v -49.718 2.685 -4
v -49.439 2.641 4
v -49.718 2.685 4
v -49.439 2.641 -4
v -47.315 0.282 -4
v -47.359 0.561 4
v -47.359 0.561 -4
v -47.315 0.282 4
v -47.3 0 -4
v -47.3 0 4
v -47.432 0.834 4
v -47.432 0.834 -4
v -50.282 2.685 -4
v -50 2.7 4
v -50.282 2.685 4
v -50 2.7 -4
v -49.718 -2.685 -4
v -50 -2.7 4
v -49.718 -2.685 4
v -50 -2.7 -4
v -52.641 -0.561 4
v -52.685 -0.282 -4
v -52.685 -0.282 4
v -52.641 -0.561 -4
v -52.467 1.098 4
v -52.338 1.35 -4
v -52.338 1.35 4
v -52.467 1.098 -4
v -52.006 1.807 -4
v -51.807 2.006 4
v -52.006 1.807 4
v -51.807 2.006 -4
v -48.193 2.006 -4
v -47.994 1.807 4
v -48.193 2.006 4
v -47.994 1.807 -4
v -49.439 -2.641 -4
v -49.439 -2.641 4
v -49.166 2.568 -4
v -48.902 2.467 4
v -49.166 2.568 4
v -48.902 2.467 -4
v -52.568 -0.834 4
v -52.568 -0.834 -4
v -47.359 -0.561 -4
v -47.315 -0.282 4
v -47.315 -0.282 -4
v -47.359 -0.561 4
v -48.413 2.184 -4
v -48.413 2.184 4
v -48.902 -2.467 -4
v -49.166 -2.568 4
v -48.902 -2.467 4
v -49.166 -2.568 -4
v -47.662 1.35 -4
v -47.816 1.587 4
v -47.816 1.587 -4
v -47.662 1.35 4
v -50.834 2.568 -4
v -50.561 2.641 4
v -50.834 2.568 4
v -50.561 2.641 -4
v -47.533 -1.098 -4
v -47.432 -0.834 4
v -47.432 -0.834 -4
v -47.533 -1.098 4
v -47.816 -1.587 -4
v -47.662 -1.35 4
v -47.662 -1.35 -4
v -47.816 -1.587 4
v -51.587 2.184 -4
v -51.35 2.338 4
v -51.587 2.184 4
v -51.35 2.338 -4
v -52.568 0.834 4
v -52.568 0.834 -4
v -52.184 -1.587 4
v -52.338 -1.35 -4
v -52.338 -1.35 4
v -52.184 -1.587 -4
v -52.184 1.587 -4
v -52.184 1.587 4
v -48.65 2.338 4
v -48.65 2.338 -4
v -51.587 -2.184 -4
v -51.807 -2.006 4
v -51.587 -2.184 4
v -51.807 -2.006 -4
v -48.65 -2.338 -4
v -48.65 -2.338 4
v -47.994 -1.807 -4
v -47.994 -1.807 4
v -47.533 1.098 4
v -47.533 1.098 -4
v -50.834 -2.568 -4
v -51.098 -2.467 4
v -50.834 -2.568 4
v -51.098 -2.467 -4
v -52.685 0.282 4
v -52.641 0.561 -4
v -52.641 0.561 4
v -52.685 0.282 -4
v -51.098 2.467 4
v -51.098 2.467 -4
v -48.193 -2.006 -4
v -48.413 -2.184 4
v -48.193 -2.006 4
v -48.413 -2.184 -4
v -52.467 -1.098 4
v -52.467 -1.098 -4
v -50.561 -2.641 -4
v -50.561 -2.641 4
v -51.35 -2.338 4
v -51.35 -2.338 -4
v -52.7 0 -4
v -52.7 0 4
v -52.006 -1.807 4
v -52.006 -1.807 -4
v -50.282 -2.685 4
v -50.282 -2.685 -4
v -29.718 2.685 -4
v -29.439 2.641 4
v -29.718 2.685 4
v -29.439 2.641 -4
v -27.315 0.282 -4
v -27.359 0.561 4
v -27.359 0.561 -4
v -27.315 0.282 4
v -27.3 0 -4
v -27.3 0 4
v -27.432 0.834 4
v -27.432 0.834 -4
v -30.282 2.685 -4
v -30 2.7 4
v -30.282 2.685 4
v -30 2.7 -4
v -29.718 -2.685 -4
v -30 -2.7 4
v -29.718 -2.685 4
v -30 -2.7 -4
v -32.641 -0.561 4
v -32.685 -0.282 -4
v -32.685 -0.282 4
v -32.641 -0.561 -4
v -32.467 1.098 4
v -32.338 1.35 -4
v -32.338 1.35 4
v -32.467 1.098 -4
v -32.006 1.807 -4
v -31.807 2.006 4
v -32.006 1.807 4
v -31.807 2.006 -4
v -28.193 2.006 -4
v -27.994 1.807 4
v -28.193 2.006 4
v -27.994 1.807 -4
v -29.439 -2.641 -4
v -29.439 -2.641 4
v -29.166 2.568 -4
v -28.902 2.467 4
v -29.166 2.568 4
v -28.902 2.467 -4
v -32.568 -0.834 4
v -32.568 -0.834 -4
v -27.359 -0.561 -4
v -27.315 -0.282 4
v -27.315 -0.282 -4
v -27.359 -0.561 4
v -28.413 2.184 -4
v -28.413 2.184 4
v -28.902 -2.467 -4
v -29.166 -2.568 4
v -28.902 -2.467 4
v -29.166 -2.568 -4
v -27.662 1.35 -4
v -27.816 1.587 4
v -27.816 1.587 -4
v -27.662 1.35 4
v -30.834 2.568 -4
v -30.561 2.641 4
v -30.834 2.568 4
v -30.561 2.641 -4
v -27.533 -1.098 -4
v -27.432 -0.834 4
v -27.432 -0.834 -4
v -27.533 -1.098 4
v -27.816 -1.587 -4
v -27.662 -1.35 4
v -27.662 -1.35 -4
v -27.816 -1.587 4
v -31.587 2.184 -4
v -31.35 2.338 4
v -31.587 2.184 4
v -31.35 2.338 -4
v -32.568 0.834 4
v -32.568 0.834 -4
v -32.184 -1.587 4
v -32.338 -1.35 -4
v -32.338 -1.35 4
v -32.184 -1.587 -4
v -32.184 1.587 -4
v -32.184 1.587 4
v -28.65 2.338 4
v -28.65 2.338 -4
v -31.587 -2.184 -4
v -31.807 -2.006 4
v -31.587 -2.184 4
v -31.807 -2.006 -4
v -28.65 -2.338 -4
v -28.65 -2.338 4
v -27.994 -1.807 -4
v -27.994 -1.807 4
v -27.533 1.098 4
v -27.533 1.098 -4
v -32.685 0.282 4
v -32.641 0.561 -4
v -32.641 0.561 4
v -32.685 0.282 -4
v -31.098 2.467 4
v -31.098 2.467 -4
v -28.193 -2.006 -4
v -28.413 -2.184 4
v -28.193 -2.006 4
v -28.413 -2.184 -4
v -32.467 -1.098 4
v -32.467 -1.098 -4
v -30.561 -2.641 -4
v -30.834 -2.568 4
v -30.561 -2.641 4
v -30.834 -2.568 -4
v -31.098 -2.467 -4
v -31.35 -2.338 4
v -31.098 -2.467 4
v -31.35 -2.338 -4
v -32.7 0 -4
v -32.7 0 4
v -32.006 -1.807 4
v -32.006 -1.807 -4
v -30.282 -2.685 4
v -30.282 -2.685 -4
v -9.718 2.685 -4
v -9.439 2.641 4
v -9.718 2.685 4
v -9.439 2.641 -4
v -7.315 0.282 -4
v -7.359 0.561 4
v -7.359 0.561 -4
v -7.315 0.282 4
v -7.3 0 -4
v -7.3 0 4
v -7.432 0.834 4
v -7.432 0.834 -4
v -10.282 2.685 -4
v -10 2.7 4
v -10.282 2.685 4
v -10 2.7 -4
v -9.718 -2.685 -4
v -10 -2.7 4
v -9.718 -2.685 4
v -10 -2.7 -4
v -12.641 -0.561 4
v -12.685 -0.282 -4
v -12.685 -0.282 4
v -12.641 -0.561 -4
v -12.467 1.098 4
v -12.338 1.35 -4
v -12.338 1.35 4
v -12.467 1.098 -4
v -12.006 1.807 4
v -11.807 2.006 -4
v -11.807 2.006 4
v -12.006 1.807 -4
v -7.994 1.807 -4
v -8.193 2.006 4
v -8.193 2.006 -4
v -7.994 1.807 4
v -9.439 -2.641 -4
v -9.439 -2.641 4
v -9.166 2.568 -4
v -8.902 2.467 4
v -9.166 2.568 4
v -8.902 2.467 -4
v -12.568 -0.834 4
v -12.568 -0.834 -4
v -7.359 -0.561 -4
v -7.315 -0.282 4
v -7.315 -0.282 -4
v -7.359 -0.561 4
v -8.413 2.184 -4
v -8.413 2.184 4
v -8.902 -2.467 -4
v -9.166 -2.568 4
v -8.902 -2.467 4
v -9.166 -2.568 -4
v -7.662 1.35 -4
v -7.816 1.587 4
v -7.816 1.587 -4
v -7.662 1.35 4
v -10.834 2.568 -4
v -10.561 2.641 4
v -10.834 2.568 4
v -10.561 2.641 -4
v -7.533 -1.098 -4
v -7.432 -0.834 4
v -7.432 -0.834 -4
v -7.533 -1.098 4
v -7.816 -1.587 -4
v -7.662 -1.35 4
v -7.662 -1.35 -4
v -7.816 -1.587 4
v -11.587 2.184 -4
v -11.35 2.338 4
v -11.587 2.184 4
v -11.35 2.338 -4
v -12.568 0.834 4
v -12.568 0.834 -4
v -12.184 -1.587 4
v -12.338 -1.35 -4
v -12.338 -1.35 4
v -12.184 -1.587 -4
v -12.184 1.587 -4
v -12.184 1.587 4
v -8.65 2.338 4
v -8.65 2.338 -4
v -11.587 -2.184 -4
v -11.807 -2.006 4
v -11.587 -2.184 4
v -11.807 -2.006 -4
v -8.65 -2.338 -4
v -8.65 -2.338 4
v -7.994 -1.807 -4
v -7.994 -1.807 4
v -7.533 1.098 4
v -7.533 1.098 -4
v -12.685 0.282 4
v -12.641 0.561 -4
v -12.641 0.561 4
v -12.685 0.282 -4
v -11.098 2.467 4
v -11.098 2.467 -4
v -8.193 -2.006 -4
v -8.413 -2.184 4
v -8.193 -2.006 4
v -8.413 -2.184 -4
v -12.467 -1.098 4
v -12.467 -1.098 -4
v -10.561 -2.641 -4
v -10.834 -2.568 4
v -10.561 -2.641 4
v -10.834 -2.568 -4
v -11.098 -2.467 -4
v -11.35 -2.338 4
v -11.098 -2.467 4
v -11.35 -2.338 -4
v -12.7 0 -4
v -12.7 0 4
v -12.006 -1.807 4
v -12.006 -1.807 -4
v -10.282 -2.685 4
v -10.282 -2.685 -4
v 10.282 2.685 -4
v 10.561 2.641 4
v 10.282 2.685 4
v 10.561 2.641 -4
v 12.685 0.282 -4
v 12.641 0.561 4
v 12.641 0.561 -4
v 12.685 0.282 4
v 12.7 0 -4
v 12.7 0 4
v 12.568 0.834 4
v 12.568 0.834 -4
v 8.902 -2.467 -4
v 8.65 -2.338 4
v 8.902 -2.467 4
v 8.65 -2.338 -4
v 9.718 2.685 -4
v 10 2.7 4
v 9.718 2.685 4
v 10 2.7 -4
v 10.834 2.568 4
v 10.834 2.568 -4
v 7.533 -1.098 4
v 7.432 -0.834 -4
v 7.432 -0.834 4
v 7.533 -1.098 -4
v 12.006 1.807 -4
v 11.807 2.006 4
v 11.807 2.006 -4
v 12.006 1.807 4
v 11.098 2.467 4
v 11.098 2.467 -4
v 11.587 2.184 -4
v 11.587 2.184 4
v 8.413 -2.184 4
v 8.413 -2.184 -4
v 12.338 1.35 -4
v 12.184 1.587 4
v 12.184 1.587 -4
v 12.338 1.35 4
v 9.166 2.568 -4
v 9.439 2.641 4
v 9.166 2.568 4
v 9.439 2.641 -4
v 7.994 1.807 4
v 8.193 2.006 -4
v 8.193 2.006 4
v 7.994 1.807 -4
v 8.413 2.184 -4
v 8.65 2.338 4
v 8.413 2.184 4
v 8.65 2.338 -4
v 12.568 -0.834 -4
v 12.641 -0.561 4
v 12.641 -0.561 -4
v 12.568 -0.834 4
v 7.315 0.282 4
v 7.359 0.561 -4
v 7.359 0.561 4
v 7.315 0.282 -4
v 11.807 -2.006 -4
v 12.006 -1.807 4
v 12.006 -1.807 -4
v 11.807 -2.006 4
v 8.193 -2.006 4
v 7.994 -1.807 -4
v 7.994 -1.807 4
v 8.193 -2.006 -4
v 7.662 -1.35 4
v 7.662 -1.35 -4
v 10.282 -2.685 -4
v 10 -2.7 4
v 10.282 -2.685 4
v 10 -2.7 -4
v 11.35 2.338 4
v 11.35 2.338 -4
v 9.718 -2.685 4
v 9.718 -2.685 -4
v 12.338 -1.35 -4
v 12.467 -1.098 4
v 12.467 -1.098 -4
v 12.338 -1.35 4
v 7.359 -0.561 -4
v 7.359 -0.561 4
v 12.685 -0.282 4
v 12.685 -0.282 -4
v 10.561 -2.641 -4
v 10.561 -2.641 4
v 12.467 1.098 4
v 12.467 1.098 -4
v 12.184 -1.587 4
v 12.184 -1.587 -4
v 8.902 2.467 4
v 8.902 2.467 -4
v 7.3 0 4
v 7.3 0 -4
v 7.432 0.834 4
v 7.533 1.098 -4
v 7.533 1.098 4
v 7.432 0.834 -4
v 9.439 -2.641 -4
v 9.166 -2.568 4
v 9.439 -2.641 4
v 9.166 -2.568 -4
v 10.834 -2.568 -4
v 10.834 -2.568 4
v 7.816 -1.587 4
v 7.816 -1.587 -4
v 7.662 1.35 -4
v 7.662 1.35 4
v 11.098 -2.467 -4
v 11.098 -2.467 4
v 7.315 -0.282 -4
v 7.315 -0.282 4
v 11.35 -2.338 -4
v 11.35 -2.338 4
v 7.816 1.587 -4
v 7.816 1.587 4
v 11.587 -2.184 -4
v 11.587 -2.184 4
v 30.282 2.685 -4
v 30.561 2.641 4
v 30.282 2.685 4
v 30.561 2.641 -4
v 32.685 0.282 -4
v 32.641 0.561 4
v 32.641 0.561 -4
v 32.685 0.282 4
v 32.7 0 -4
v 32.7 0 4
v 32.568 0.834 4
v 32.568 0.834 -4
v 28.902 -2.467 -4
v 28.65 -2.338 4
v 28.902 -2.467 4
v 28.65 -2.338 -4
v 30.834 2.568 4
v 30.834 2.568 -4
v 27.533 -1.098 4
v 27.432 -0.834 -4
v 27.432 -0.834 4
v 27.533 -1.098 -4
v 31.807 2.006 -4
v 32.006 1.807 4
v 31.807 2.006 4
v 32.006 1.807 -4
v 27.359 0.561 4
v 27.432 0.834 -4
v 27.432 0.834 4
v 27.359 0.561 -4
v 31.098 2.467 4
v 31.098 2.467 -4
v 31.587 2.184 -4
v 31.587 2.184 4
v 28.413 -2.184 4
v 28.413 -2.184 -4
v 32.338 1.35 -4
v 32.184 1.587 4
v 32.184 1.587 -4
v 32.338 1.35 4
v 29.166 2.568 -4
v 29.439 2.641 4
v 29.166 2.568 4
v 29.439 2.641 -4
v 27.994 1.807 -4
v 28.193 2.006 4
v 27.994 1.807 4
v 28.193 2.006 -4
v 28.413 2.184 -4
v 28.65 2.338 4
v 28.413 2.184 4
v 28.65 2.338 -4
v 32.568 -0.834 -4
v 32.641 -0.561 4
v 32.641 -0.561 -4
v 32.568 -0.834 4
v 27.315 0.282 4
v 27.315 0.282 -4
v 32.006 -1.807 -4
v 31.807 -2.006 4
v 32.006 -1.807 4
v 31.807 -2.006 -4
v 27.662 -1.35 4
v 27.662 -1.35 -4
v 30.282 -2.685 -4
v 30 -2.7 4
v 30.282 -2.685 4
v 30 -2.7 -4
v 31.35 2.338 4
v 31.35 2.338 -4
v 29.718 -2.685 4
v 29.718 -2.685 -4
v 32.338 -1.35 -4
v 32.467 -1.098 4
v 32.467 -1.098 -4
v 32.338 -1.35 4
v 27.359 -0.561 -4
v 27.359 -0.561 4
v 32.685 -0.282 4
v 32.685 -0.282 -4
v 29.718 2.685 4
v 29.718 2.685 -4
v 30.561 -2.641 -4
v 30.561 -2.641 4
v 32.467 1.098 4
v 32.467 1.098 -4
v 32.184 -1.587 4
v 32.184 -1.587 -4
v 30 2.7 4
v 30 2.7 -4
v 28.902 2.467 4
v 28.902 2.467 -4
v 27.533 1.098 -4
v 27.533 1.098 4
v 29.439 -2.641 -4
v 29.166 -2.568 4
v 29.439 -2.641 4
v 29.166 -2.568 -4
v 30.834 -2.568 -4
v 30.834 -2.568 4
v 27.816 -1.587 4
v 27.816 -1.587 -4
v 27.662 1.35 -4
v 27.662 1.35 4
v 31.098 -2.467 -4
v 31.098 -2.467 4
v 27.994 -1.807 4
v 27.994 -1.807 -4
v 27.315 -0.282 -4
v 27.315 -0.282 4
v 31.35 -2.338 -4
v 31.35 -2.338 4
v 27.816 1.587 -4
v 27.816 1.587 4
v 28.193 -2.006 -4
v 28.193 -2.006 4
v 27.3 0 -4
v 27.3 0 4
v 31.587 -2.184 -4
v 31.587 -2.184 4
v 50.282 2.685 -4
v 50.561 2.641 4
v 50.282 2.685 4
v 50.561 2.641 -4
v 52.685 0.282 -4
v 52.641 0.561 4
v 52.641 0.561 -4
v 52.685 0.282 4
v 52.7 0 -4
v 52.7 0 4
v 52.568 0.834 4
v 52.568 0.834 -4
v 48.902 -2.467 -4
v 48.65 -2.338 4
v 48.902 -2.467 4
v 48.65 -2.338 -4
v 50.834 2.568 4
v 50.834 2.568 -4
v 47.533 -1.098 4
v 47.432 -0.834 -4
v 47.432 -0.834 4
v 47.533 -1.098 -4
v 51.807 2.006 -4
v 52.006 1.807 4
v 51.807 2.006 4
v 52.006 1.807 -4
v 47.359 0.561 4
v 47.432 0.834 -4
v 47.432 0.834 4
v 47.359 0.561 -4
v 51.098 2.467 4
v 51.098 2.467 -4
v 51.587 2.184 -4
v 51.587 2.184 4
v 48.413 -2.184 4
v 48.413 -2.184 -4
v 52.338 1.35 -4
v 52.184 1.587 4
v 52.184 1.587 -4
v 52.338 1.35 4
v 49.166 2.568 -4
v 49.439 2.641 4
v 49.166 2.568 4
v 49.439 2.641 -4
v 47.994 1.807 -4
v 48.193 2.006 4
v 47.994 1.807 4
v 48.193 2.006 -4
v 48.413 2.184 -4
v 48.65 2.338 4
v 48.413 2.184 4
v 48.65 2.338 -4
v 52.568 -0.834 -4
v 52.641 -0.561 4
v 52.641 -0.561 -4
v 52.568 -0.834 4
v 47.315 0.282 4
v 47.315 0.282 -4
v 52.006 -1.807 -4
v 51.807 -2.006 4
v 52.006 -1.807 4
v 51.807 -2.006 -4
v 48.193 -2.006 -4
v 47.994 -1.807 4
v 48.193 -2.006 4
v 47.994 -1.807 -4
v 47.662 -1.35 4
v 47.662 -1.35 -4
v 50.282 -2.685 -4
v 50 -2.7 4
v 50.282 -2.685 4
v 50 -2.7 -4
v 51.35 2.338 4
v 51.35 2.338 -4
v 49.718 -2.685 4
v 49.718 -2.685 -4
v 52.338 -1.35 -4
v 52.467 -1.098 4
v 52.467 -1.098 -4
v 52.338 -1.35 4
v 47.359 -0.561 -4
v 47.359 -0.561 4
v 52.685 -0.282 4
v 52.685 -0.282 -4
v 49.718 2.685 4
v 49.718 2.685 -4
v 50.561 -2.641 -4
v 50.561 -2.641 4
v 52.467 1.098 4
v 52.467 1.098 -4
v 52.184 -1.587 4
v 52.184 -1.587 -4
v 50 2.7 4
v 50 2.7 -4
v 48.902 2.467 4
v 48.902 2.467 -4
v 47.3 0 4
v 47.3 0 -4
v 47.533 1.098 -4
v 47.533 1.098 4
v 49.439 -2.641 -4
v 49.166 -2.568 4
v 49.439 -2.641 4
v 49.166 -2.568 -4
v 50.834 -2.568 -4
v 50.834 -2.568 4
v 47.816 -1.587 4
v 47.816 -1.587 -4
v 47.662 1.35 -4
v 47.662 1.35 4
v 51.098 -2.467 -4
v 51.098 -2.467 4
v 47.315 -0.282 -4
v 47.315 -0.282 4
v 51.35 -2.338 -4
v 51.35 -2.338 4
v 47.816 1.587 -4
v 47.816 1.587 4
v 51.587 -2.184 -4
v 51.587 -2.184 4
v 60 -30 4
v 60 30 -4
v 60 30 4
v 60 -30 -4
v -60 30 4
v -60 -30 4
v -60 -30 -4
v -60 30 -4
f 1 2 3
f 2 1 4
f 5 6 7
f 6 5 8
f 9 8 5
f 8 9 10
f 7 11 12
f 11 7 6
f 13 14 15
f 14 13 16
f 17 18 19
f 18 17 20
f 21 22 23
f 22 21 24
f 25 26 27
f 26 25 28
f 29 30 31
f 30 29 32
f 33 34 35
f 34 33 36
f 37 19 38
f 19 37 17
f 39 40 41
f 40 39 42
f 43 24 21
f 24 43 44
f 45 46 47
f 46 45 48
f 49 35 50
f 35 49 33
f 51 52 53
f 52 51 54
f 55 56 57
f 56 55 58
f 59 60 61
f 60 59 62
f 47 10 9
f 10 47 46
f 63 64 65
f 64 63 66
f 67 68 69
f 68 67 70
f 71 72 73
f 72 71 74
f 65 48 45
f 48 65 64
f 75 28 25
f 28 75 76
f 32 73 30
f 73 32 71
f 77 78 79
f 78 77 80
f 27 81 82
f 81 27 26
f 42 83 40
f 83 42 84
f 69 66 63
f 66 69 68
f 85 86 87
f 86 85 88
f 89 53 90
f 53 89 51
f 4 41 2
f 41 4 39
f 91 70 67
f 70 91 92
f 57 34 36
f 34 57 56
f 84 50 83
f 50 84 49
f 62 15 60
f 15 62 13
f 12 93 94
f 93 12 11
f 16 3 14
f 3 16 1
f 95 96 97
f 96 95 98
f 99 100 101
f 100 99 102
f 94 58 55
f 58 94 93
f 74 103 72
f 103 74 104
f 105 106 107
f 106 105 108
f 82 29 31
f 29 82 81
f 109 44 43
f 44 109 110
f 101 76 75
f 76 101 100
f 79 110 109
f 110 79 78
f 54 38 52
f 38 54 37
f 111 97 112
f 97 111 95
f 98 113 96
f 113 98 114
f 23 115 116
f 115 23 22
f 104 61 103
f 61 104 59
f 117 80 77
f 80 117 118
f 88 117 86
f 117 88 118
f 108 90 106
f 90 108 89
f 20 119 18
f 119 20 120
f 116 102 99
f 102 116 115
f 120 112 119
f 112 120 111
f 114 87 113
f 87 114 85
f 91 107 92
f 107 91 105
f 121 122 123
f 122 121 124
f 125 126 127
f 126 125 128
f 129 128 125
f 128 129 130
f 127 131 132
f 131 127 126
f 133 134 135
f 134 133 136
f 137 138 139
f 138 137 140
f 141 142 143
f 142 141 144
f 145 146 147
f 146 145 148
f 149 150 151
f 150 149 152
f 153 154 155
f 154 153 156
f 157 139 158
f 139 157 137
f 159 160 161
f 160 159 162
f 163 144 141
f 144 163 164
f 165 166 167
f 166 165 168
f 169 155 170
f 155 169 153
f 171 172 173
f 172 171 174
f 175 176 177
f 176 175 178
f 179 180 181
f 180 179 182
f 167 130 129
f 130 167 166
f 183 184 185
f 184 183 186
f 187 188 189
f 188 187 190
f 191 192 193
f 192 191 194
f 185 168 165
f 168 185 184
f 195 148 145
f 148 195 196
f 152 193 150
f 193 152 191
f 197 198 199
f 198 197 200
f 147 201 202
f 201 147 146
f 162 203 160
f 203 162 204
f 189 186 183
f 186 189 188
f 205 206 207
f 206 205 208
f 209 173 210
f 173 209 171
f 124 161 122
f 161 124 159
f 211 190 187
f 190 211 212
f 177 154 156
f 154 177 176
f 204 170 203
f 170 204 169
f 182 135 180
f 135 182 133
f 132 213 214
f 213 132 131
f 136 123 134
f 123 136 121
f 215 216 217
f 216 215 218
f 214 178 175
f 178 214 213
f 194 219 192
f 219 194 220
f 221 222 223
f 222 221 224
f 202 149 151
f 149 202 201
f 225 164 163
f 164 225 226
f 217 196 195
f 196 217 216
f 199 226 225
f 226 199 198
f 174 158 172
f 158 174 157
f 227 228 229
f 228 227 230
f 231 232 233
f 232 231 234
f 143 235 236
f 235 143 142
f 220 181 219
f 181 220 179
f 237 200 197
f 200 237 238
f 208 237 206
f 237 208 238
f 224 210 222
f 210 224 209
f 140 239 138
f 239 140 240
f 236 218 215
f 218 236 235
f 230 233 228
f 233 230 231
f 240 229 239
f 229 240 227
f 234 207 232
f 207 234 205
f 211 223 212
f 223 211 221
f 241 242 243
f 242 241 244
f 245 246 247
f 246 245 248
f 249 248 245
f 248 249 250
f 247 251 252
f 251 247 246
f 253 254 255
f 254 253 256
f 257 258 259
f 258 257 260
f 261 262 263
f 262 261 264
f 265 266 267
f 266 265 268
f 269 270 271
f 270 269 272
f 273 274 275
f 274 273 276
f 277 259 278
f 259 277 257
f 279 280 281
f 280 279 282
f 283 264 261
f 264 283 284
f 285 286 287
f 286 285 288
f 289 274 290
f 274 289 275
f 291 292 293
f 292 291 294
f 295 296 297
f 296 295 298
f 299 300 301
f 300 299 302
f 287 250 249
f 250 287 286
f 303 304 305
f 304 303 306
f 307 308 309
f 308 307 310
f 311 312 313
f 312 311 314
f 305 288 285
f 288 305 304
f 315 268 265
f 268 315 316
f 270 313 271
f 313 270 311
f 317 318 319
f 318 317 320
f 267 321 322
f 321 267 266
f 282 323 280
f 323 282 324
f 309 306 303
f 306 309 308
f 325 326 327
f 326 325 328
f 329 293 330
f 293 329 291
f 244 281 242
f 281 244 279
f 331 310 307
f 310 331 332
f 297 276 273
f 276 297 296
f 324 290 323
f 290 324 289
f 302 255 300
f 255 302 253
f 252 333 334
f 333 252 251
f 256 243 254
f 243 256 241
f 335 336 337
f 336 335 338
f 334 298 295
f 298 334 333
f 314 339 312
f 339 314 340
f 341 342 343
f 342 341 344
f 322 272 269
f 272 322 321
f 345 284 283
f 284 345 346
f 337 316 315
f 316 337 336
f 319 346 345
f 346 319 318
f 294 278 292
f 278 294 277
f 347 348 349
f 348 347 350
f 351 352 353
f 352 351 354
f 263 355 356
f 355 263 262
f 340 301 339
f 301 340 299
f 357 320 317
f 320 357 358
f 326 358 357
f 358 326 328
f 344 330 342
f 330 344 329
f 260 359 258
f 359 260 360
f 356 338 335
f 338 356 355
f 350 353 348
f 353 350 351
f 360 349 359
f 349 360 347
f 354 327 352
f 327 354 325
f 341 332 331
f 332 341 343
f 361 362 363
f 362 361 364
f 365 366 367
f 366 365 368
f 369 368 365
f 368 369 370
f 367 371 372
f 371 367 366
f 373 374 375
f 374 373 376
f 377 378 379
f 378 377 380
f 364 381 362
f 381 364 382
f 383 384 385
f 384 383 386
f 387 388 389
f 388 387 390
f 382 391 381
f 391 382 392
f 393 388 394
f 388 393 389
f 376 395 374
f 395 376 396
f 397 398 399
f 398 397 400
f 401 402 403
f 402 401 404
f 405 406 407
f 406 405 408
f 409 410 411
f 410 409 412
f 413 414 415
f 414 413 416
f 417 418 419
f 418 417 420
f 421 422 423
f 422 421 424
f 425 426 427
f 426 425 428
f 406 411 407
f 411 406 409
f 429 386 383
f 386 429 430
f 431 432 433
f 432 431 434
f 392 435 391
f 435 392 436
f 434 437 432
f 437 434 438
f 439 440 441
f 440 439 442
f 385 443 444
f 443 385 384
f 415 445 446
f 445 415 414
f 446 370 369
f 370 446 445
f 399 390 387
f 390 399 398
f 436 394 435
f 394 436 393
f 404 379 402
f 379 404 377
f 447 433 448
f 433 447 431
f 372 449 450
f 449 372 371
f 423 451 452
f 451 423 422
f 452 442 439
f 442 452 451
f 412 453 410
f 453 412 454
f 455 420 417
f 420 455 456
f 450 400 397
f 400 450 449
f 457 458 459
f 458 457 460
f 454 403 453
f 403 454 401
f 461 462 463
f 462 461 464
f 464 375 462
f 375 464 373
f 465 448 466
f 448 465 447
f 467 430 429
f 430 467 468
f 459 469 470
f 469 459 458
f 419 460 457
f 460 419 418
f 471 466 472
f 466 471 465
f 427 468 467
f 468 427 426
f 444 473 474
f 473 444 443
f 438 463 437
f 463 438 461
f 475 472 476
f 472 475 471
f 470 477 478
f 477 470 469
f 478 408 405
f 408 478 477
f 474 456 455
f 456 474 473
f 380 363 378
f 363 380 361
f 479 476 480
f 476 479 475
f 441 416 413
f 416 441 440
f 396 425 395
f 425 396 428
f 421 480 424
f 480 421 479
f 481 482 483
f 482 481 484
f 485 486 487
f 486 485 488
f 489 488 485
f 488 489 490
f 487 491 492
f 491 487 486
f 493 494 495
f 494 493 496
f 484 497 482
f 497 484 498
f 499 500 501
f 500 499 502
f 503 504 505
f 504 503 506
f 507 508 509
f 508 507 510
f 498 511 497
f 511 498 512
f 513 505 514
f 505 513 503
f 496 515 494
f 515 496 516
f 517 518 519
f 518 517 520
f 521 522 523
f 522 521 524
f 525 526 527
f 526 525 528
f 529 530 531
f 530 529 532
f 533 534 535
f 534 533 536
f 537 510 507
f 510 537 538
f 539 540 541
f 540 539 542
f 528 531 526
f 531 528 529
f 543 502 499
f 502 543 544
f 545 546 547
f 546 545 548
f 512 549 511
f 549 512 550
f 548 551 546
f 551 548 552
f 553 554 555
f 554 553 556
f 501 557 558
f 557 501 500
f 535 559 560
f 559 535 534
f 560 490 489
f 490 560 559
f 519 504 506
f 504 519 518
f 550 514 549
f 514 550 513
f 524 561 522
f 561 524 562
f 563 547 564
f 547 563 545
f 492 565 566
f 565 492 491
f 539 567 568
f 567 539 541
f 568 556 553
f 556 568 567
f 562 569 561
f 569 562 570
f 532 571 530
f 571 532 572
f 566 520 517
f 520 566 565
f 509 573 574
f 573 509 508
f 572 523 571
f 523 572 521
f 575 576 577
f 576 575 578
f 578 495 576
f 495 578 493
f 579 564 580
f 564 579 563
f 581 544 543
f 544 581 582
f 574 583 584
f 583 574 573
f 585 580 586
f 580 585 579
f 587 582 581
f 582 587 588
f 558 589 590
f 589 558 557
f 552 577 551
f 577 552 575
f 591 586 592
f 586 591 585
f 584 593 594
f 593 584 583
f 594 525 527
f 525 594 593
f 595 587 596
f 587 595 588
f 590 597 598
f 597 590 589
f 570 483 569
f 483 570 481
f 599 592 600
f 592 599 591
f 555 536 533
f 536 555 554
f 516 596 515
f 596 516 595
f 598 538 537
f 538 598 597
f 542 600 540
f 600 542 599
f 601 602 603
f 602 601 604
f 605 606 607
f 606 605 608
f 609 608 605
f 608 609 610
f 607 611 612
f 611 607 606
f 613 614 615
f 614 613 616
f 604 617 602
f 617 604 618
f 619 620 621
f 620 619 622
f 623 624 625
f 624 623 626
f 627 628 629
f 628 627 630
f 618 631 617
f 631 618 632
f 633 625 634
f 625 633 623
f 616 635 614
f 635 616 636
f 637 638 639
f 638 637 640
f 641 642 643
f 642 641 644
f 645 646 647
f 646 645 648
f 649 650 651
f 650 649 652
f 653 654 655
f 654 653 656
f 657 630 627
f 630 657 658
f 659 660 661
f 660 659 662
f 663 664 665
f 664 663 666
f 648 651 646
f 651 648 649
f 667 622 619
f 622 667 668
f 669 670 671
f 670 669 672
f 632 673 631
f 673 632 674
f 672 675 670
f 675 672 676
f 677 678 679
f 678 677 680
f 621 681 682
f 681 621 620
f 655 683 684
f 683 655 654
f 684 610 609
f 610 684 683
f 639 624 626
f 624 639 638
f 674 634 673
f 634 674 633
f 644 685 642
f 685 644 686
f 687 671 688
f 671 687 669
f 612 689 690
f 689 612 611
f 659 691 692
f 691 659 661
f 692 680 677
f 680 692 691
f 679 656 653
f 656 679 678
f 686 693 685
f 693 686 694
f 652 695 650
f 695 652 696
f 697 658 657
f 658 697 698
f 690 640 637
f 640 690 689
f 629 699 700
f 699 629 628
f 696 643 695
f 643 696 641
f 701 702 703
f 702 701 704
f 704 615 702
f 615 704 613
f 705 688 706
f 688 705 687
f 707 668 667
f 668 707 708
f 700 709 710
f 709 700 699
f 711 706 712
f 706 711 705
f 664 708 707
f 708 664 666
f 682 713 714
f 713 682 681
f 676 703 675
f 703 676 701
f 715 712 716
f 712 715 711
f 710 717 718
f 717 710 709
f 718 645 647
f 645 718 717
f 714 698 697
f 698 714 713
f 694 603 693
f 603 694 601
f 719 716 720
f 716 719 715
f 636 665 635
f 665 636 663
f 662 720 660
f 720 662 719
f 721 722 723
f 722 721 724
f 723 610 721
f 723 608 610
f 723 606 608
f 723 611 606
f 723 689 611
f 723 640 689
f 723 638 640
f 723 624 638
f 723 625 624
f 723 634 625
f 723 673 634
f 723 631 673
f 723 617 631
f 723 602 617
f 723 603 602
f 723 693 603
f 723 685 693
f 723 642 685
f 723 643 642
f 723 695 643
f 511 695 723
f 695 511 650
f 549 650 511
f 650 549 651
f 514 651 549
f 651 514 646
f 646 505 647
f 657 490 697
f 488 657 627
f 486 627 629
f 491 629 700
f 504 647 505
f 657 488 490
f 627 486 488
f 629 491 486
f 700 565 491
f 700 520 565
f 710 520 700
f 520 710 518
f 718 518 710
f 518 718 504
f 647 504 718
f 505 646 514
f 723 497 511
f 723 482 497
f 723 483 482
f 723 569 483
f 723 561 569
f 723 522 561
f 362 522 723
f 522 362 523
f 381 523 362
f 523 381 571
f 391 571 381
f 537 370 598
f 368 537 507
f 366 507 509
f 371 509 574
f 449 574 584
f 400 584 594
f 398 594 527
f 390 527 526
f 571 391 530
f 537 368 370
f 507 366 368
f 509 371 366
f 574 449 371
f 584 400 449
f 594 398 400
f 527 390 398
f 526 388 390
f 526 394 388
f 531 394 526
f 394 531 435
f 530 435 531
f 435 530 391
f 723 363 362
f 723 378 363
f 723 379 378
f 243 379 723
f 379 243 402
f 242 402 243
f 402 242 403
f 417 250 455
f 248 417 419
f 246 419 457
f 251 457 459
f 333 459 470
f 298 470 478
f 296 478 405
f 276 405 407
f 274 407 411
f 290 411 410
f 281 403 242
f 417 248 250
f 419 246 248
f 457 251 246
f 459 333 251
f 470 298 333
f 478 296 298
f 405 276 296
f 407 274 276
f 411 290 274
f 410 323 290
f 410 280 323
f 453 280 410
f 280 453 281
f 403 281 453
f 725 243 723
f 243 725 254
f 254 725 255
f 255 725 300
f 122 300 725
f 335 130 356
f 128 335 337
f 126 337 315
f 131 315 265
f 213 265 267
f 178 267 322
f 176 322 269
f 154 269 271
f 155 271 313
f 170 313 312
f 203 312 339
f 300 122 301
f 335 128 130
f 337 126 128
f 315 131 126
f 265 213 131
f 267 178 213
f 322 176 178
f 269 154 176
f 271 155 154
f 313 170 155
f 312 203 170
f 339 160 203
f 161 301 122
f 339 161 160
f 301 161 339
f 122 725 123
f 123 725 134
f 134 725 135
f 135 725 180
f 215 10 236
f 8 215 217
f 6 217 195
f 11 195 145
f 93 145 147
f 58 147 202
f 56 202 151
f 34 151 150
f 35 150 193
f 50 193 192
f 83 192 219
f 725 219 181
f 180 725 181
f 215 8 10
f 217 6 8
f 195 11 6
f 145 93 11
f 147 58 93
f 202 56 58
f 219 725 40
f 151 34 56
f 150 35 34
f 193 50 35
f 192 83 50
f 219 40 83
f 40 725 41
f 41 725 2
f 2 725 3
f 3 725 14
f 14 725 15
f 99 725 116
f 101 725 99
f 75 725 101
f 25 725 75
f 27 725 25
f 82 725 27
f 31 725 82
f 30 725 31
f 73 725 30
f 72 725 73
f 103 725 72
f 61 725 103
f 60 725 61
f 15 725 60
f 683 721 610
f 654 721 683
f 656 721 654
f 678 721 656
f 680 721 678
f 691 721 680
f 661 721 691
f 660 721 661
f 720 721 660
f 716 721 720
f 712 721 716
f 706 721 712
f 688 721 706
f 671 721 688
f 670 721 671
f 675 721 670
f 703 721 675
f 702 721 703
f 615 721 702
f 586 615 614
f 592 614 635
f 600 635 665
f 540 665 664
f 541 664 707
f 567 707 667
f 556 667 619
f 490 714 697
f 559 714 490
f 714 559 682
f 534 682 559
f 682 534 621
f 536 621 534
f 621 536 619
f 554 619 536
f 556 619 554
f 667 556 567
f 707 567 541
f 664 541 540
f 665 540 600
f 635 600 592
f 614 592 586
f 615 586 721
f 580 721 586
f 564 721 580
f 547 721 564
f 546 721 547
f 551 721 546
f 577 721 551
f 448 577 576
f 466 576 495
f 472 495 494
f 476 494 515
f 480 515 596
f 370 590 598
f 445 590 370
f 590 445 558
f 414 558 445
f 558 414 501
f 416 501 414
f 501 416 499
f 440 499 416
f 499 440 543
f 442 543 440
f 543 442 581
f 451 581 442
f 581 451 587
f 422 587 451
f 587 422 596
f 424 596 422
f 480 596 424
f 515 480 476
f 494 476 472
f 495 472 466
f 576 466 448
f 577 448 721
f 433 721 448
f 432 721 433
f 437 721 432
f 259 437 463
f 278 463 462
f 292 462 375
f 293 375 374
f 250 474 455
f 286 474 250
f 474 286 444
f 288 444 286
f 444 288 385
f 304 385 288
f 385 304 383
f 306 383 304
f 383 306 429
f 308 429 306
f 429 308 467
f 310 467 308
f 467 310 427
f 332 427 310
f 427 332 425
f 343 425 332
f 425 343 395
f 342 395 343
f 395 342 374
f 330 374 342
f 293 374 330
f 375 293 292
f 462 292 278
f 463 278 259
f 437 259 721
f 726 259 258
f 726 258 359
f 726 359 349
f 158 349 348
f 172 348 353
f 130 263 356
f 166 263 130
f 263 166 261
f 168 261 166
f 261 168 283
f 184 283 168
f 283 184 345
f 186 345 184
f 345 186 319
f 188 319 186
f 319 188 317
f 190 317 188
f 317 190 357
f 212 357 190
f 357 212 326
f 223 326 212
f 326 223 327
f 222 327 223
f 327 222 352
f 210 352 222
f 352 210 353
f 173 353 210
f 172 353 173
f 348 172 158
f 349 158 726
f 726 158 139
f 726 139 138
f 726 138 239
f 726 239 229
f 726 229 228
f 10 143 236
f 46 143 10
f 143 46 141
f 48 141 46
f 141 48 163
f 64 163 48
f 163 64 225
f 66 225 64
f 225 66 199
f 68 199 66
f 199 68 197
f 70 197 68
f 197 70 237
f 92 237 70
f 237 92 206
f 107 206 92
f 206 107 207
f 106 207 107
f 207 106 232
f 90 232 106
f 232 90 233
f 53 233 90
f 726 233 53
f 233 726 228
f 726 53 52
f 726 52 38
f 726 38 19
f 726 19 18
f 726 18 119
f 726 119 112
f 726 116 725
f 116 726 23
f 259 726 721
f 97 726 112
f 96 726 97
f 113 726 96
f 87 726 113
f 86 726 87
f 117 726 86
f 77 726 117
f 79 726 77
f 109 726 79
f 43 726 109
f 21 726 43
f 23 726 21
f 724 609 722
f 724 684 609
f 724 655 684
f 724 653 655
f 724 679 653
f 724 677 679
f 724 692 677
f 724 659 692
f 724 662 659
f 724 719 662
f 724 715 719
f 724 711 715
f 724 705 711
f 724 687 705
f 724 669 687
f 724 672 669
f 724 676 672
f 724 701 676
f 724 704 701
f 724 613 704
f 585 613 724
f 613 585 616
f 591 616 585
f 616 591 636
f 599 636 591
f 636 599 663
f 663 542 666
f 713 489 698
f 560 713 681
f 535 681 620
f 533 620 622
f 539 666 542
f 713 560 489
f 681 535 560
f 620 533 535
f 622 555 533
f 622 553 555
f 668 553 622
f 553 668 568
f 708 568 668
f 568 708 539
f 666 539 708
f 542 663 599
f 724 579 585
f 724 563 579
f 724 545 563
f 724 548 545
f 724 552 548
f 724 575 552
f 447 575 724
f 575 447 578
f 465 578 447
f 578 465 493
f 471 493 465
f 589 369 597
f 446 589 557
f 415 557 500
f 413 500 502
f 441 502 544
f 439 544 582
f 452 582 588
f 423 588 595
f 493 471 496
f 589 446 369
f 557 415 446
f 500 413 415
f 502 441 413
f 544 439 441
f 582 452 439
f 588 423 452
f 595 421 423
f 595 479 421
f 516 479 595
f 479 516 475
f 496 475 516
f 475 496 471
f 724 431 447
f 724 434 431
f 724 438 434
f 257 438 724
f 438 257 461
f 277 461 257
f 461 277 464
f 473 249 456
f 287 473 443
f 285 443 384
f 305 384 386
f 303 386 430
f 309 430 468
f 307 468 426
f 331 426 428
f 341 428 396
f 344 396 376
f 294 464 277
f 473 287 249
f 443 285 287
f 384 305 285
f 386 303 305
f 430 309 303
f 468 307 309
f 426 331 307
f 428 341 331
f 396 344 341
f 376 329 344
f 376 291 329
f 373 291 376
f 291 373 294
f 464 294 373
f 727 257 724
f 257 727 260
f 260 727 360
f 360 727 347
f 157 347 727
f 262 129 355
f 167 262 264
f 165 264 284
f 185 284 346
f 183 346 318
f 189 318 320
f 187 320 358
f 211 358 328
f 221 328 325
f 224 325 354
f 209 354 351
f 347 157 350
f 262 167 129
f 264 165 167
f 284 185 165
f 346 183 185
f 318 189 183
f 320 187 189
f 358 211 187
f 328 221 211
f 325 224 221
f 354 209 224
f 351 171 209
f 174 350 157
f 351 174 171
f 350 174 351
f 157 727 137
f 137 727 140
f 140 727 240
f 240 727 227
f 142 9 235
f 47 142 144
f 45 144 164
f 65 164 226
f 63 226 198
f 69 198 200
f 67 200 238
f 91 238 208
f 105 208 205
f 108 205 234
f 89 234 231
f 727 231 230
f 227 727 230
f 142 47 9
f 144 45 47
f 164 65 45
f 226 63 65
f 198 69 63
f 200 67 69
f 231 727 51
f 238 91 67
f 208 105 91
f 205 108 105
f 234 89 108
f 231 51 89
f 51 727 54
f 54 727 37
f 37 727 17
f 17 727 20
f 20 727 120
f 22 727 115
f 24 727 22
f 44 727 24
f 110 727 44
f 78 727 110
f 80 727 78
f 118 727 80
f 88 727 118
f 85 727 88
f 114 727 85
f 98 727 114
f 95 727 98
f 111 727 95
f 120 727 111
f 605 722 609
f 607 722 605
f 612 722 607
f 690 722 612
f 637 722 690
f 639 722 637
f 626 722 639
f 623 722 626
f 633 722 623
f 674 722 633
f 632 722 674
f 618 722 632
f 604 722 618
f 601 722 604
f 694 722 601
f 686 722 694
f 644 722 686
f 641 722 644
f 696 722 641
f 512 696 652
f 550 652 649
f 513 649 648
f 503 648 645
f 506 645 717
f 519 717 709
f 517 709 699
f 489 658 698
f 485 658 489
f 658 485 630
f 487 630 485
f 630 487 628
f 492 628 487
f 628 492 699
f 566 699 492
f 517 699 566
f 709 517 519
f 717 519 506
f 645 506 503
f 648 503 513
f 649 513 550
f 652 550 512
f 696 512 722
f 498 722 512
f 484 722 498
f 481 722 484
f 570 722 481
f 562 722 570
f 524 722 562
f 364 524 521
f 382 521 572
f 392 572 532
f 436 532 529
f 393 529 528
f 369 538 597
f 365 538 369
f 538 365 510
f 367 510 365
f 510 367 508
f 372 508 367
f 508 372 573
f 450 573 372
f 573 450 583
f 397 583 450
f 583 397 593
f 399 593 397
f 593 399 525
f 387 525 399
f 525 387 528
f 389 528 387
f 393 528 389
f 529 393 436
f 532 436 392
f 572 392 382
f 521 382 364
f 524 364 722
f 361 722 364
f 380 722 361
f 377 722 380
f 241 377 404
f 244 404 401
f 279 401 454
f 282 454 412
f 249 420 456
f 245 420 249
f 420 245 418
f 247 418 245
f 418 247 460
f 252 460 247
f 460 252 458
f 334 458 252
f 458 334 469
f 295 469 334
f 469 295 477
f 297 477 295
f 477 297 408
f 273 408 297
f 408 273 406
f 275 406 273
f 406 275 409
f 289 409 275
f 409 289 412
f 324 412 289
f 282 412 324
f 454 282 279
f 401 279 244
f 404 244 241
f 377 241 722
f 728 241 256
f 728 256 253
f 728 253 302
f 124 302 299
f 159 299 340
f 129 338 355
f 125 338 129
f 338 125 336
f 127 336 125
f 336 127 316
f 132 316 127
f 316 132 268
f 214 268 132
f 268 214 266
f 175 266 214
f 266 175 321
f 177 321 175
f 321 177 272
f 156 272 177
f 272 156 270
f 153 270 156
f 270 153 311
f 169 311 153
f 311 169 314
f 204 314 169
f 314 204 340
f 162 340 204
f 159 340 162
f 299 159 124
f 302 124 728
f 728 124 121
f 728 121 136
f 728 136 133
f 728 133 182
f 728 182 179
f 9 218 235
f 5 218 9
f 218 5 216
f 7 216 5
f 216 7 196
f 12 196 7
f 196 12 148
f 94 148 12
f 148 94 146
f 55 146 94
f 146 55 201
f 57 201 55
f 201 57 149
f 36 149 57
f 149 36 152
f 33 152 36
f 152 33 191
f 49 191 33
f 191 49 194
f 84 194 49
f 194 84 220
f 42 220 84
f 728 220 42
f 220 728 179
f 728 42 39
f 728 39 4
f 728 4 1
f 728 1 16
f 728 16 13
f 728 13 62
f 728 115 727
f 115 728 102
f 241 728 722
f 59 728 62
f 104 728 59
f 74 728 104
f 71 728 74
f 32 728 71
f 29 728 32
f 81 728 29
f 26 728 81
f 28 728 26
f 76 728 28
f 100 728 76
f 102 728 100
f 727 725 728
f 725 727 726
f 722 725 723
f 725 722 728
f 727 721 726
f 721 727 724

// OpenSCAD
// Multi-hole mounting plate.
$fn = 60;
eps = 0.02;
plate_l = 120;
plate_w = 60;
plate_t = 8;
hole_d = 5.4;
edge = 10;
difference() {
    cube([plate_l, plate_w, plate_t], center = true);
    for (i = [0 : 5])
        translate([-plate_l / 2 + edge + i * (plate_l - 2 * edge) / max(1, 5), 0, -plate_t / 2 - eps])
            cylinder(d = hole_d, h = plate_t + 2 * eps);
}
